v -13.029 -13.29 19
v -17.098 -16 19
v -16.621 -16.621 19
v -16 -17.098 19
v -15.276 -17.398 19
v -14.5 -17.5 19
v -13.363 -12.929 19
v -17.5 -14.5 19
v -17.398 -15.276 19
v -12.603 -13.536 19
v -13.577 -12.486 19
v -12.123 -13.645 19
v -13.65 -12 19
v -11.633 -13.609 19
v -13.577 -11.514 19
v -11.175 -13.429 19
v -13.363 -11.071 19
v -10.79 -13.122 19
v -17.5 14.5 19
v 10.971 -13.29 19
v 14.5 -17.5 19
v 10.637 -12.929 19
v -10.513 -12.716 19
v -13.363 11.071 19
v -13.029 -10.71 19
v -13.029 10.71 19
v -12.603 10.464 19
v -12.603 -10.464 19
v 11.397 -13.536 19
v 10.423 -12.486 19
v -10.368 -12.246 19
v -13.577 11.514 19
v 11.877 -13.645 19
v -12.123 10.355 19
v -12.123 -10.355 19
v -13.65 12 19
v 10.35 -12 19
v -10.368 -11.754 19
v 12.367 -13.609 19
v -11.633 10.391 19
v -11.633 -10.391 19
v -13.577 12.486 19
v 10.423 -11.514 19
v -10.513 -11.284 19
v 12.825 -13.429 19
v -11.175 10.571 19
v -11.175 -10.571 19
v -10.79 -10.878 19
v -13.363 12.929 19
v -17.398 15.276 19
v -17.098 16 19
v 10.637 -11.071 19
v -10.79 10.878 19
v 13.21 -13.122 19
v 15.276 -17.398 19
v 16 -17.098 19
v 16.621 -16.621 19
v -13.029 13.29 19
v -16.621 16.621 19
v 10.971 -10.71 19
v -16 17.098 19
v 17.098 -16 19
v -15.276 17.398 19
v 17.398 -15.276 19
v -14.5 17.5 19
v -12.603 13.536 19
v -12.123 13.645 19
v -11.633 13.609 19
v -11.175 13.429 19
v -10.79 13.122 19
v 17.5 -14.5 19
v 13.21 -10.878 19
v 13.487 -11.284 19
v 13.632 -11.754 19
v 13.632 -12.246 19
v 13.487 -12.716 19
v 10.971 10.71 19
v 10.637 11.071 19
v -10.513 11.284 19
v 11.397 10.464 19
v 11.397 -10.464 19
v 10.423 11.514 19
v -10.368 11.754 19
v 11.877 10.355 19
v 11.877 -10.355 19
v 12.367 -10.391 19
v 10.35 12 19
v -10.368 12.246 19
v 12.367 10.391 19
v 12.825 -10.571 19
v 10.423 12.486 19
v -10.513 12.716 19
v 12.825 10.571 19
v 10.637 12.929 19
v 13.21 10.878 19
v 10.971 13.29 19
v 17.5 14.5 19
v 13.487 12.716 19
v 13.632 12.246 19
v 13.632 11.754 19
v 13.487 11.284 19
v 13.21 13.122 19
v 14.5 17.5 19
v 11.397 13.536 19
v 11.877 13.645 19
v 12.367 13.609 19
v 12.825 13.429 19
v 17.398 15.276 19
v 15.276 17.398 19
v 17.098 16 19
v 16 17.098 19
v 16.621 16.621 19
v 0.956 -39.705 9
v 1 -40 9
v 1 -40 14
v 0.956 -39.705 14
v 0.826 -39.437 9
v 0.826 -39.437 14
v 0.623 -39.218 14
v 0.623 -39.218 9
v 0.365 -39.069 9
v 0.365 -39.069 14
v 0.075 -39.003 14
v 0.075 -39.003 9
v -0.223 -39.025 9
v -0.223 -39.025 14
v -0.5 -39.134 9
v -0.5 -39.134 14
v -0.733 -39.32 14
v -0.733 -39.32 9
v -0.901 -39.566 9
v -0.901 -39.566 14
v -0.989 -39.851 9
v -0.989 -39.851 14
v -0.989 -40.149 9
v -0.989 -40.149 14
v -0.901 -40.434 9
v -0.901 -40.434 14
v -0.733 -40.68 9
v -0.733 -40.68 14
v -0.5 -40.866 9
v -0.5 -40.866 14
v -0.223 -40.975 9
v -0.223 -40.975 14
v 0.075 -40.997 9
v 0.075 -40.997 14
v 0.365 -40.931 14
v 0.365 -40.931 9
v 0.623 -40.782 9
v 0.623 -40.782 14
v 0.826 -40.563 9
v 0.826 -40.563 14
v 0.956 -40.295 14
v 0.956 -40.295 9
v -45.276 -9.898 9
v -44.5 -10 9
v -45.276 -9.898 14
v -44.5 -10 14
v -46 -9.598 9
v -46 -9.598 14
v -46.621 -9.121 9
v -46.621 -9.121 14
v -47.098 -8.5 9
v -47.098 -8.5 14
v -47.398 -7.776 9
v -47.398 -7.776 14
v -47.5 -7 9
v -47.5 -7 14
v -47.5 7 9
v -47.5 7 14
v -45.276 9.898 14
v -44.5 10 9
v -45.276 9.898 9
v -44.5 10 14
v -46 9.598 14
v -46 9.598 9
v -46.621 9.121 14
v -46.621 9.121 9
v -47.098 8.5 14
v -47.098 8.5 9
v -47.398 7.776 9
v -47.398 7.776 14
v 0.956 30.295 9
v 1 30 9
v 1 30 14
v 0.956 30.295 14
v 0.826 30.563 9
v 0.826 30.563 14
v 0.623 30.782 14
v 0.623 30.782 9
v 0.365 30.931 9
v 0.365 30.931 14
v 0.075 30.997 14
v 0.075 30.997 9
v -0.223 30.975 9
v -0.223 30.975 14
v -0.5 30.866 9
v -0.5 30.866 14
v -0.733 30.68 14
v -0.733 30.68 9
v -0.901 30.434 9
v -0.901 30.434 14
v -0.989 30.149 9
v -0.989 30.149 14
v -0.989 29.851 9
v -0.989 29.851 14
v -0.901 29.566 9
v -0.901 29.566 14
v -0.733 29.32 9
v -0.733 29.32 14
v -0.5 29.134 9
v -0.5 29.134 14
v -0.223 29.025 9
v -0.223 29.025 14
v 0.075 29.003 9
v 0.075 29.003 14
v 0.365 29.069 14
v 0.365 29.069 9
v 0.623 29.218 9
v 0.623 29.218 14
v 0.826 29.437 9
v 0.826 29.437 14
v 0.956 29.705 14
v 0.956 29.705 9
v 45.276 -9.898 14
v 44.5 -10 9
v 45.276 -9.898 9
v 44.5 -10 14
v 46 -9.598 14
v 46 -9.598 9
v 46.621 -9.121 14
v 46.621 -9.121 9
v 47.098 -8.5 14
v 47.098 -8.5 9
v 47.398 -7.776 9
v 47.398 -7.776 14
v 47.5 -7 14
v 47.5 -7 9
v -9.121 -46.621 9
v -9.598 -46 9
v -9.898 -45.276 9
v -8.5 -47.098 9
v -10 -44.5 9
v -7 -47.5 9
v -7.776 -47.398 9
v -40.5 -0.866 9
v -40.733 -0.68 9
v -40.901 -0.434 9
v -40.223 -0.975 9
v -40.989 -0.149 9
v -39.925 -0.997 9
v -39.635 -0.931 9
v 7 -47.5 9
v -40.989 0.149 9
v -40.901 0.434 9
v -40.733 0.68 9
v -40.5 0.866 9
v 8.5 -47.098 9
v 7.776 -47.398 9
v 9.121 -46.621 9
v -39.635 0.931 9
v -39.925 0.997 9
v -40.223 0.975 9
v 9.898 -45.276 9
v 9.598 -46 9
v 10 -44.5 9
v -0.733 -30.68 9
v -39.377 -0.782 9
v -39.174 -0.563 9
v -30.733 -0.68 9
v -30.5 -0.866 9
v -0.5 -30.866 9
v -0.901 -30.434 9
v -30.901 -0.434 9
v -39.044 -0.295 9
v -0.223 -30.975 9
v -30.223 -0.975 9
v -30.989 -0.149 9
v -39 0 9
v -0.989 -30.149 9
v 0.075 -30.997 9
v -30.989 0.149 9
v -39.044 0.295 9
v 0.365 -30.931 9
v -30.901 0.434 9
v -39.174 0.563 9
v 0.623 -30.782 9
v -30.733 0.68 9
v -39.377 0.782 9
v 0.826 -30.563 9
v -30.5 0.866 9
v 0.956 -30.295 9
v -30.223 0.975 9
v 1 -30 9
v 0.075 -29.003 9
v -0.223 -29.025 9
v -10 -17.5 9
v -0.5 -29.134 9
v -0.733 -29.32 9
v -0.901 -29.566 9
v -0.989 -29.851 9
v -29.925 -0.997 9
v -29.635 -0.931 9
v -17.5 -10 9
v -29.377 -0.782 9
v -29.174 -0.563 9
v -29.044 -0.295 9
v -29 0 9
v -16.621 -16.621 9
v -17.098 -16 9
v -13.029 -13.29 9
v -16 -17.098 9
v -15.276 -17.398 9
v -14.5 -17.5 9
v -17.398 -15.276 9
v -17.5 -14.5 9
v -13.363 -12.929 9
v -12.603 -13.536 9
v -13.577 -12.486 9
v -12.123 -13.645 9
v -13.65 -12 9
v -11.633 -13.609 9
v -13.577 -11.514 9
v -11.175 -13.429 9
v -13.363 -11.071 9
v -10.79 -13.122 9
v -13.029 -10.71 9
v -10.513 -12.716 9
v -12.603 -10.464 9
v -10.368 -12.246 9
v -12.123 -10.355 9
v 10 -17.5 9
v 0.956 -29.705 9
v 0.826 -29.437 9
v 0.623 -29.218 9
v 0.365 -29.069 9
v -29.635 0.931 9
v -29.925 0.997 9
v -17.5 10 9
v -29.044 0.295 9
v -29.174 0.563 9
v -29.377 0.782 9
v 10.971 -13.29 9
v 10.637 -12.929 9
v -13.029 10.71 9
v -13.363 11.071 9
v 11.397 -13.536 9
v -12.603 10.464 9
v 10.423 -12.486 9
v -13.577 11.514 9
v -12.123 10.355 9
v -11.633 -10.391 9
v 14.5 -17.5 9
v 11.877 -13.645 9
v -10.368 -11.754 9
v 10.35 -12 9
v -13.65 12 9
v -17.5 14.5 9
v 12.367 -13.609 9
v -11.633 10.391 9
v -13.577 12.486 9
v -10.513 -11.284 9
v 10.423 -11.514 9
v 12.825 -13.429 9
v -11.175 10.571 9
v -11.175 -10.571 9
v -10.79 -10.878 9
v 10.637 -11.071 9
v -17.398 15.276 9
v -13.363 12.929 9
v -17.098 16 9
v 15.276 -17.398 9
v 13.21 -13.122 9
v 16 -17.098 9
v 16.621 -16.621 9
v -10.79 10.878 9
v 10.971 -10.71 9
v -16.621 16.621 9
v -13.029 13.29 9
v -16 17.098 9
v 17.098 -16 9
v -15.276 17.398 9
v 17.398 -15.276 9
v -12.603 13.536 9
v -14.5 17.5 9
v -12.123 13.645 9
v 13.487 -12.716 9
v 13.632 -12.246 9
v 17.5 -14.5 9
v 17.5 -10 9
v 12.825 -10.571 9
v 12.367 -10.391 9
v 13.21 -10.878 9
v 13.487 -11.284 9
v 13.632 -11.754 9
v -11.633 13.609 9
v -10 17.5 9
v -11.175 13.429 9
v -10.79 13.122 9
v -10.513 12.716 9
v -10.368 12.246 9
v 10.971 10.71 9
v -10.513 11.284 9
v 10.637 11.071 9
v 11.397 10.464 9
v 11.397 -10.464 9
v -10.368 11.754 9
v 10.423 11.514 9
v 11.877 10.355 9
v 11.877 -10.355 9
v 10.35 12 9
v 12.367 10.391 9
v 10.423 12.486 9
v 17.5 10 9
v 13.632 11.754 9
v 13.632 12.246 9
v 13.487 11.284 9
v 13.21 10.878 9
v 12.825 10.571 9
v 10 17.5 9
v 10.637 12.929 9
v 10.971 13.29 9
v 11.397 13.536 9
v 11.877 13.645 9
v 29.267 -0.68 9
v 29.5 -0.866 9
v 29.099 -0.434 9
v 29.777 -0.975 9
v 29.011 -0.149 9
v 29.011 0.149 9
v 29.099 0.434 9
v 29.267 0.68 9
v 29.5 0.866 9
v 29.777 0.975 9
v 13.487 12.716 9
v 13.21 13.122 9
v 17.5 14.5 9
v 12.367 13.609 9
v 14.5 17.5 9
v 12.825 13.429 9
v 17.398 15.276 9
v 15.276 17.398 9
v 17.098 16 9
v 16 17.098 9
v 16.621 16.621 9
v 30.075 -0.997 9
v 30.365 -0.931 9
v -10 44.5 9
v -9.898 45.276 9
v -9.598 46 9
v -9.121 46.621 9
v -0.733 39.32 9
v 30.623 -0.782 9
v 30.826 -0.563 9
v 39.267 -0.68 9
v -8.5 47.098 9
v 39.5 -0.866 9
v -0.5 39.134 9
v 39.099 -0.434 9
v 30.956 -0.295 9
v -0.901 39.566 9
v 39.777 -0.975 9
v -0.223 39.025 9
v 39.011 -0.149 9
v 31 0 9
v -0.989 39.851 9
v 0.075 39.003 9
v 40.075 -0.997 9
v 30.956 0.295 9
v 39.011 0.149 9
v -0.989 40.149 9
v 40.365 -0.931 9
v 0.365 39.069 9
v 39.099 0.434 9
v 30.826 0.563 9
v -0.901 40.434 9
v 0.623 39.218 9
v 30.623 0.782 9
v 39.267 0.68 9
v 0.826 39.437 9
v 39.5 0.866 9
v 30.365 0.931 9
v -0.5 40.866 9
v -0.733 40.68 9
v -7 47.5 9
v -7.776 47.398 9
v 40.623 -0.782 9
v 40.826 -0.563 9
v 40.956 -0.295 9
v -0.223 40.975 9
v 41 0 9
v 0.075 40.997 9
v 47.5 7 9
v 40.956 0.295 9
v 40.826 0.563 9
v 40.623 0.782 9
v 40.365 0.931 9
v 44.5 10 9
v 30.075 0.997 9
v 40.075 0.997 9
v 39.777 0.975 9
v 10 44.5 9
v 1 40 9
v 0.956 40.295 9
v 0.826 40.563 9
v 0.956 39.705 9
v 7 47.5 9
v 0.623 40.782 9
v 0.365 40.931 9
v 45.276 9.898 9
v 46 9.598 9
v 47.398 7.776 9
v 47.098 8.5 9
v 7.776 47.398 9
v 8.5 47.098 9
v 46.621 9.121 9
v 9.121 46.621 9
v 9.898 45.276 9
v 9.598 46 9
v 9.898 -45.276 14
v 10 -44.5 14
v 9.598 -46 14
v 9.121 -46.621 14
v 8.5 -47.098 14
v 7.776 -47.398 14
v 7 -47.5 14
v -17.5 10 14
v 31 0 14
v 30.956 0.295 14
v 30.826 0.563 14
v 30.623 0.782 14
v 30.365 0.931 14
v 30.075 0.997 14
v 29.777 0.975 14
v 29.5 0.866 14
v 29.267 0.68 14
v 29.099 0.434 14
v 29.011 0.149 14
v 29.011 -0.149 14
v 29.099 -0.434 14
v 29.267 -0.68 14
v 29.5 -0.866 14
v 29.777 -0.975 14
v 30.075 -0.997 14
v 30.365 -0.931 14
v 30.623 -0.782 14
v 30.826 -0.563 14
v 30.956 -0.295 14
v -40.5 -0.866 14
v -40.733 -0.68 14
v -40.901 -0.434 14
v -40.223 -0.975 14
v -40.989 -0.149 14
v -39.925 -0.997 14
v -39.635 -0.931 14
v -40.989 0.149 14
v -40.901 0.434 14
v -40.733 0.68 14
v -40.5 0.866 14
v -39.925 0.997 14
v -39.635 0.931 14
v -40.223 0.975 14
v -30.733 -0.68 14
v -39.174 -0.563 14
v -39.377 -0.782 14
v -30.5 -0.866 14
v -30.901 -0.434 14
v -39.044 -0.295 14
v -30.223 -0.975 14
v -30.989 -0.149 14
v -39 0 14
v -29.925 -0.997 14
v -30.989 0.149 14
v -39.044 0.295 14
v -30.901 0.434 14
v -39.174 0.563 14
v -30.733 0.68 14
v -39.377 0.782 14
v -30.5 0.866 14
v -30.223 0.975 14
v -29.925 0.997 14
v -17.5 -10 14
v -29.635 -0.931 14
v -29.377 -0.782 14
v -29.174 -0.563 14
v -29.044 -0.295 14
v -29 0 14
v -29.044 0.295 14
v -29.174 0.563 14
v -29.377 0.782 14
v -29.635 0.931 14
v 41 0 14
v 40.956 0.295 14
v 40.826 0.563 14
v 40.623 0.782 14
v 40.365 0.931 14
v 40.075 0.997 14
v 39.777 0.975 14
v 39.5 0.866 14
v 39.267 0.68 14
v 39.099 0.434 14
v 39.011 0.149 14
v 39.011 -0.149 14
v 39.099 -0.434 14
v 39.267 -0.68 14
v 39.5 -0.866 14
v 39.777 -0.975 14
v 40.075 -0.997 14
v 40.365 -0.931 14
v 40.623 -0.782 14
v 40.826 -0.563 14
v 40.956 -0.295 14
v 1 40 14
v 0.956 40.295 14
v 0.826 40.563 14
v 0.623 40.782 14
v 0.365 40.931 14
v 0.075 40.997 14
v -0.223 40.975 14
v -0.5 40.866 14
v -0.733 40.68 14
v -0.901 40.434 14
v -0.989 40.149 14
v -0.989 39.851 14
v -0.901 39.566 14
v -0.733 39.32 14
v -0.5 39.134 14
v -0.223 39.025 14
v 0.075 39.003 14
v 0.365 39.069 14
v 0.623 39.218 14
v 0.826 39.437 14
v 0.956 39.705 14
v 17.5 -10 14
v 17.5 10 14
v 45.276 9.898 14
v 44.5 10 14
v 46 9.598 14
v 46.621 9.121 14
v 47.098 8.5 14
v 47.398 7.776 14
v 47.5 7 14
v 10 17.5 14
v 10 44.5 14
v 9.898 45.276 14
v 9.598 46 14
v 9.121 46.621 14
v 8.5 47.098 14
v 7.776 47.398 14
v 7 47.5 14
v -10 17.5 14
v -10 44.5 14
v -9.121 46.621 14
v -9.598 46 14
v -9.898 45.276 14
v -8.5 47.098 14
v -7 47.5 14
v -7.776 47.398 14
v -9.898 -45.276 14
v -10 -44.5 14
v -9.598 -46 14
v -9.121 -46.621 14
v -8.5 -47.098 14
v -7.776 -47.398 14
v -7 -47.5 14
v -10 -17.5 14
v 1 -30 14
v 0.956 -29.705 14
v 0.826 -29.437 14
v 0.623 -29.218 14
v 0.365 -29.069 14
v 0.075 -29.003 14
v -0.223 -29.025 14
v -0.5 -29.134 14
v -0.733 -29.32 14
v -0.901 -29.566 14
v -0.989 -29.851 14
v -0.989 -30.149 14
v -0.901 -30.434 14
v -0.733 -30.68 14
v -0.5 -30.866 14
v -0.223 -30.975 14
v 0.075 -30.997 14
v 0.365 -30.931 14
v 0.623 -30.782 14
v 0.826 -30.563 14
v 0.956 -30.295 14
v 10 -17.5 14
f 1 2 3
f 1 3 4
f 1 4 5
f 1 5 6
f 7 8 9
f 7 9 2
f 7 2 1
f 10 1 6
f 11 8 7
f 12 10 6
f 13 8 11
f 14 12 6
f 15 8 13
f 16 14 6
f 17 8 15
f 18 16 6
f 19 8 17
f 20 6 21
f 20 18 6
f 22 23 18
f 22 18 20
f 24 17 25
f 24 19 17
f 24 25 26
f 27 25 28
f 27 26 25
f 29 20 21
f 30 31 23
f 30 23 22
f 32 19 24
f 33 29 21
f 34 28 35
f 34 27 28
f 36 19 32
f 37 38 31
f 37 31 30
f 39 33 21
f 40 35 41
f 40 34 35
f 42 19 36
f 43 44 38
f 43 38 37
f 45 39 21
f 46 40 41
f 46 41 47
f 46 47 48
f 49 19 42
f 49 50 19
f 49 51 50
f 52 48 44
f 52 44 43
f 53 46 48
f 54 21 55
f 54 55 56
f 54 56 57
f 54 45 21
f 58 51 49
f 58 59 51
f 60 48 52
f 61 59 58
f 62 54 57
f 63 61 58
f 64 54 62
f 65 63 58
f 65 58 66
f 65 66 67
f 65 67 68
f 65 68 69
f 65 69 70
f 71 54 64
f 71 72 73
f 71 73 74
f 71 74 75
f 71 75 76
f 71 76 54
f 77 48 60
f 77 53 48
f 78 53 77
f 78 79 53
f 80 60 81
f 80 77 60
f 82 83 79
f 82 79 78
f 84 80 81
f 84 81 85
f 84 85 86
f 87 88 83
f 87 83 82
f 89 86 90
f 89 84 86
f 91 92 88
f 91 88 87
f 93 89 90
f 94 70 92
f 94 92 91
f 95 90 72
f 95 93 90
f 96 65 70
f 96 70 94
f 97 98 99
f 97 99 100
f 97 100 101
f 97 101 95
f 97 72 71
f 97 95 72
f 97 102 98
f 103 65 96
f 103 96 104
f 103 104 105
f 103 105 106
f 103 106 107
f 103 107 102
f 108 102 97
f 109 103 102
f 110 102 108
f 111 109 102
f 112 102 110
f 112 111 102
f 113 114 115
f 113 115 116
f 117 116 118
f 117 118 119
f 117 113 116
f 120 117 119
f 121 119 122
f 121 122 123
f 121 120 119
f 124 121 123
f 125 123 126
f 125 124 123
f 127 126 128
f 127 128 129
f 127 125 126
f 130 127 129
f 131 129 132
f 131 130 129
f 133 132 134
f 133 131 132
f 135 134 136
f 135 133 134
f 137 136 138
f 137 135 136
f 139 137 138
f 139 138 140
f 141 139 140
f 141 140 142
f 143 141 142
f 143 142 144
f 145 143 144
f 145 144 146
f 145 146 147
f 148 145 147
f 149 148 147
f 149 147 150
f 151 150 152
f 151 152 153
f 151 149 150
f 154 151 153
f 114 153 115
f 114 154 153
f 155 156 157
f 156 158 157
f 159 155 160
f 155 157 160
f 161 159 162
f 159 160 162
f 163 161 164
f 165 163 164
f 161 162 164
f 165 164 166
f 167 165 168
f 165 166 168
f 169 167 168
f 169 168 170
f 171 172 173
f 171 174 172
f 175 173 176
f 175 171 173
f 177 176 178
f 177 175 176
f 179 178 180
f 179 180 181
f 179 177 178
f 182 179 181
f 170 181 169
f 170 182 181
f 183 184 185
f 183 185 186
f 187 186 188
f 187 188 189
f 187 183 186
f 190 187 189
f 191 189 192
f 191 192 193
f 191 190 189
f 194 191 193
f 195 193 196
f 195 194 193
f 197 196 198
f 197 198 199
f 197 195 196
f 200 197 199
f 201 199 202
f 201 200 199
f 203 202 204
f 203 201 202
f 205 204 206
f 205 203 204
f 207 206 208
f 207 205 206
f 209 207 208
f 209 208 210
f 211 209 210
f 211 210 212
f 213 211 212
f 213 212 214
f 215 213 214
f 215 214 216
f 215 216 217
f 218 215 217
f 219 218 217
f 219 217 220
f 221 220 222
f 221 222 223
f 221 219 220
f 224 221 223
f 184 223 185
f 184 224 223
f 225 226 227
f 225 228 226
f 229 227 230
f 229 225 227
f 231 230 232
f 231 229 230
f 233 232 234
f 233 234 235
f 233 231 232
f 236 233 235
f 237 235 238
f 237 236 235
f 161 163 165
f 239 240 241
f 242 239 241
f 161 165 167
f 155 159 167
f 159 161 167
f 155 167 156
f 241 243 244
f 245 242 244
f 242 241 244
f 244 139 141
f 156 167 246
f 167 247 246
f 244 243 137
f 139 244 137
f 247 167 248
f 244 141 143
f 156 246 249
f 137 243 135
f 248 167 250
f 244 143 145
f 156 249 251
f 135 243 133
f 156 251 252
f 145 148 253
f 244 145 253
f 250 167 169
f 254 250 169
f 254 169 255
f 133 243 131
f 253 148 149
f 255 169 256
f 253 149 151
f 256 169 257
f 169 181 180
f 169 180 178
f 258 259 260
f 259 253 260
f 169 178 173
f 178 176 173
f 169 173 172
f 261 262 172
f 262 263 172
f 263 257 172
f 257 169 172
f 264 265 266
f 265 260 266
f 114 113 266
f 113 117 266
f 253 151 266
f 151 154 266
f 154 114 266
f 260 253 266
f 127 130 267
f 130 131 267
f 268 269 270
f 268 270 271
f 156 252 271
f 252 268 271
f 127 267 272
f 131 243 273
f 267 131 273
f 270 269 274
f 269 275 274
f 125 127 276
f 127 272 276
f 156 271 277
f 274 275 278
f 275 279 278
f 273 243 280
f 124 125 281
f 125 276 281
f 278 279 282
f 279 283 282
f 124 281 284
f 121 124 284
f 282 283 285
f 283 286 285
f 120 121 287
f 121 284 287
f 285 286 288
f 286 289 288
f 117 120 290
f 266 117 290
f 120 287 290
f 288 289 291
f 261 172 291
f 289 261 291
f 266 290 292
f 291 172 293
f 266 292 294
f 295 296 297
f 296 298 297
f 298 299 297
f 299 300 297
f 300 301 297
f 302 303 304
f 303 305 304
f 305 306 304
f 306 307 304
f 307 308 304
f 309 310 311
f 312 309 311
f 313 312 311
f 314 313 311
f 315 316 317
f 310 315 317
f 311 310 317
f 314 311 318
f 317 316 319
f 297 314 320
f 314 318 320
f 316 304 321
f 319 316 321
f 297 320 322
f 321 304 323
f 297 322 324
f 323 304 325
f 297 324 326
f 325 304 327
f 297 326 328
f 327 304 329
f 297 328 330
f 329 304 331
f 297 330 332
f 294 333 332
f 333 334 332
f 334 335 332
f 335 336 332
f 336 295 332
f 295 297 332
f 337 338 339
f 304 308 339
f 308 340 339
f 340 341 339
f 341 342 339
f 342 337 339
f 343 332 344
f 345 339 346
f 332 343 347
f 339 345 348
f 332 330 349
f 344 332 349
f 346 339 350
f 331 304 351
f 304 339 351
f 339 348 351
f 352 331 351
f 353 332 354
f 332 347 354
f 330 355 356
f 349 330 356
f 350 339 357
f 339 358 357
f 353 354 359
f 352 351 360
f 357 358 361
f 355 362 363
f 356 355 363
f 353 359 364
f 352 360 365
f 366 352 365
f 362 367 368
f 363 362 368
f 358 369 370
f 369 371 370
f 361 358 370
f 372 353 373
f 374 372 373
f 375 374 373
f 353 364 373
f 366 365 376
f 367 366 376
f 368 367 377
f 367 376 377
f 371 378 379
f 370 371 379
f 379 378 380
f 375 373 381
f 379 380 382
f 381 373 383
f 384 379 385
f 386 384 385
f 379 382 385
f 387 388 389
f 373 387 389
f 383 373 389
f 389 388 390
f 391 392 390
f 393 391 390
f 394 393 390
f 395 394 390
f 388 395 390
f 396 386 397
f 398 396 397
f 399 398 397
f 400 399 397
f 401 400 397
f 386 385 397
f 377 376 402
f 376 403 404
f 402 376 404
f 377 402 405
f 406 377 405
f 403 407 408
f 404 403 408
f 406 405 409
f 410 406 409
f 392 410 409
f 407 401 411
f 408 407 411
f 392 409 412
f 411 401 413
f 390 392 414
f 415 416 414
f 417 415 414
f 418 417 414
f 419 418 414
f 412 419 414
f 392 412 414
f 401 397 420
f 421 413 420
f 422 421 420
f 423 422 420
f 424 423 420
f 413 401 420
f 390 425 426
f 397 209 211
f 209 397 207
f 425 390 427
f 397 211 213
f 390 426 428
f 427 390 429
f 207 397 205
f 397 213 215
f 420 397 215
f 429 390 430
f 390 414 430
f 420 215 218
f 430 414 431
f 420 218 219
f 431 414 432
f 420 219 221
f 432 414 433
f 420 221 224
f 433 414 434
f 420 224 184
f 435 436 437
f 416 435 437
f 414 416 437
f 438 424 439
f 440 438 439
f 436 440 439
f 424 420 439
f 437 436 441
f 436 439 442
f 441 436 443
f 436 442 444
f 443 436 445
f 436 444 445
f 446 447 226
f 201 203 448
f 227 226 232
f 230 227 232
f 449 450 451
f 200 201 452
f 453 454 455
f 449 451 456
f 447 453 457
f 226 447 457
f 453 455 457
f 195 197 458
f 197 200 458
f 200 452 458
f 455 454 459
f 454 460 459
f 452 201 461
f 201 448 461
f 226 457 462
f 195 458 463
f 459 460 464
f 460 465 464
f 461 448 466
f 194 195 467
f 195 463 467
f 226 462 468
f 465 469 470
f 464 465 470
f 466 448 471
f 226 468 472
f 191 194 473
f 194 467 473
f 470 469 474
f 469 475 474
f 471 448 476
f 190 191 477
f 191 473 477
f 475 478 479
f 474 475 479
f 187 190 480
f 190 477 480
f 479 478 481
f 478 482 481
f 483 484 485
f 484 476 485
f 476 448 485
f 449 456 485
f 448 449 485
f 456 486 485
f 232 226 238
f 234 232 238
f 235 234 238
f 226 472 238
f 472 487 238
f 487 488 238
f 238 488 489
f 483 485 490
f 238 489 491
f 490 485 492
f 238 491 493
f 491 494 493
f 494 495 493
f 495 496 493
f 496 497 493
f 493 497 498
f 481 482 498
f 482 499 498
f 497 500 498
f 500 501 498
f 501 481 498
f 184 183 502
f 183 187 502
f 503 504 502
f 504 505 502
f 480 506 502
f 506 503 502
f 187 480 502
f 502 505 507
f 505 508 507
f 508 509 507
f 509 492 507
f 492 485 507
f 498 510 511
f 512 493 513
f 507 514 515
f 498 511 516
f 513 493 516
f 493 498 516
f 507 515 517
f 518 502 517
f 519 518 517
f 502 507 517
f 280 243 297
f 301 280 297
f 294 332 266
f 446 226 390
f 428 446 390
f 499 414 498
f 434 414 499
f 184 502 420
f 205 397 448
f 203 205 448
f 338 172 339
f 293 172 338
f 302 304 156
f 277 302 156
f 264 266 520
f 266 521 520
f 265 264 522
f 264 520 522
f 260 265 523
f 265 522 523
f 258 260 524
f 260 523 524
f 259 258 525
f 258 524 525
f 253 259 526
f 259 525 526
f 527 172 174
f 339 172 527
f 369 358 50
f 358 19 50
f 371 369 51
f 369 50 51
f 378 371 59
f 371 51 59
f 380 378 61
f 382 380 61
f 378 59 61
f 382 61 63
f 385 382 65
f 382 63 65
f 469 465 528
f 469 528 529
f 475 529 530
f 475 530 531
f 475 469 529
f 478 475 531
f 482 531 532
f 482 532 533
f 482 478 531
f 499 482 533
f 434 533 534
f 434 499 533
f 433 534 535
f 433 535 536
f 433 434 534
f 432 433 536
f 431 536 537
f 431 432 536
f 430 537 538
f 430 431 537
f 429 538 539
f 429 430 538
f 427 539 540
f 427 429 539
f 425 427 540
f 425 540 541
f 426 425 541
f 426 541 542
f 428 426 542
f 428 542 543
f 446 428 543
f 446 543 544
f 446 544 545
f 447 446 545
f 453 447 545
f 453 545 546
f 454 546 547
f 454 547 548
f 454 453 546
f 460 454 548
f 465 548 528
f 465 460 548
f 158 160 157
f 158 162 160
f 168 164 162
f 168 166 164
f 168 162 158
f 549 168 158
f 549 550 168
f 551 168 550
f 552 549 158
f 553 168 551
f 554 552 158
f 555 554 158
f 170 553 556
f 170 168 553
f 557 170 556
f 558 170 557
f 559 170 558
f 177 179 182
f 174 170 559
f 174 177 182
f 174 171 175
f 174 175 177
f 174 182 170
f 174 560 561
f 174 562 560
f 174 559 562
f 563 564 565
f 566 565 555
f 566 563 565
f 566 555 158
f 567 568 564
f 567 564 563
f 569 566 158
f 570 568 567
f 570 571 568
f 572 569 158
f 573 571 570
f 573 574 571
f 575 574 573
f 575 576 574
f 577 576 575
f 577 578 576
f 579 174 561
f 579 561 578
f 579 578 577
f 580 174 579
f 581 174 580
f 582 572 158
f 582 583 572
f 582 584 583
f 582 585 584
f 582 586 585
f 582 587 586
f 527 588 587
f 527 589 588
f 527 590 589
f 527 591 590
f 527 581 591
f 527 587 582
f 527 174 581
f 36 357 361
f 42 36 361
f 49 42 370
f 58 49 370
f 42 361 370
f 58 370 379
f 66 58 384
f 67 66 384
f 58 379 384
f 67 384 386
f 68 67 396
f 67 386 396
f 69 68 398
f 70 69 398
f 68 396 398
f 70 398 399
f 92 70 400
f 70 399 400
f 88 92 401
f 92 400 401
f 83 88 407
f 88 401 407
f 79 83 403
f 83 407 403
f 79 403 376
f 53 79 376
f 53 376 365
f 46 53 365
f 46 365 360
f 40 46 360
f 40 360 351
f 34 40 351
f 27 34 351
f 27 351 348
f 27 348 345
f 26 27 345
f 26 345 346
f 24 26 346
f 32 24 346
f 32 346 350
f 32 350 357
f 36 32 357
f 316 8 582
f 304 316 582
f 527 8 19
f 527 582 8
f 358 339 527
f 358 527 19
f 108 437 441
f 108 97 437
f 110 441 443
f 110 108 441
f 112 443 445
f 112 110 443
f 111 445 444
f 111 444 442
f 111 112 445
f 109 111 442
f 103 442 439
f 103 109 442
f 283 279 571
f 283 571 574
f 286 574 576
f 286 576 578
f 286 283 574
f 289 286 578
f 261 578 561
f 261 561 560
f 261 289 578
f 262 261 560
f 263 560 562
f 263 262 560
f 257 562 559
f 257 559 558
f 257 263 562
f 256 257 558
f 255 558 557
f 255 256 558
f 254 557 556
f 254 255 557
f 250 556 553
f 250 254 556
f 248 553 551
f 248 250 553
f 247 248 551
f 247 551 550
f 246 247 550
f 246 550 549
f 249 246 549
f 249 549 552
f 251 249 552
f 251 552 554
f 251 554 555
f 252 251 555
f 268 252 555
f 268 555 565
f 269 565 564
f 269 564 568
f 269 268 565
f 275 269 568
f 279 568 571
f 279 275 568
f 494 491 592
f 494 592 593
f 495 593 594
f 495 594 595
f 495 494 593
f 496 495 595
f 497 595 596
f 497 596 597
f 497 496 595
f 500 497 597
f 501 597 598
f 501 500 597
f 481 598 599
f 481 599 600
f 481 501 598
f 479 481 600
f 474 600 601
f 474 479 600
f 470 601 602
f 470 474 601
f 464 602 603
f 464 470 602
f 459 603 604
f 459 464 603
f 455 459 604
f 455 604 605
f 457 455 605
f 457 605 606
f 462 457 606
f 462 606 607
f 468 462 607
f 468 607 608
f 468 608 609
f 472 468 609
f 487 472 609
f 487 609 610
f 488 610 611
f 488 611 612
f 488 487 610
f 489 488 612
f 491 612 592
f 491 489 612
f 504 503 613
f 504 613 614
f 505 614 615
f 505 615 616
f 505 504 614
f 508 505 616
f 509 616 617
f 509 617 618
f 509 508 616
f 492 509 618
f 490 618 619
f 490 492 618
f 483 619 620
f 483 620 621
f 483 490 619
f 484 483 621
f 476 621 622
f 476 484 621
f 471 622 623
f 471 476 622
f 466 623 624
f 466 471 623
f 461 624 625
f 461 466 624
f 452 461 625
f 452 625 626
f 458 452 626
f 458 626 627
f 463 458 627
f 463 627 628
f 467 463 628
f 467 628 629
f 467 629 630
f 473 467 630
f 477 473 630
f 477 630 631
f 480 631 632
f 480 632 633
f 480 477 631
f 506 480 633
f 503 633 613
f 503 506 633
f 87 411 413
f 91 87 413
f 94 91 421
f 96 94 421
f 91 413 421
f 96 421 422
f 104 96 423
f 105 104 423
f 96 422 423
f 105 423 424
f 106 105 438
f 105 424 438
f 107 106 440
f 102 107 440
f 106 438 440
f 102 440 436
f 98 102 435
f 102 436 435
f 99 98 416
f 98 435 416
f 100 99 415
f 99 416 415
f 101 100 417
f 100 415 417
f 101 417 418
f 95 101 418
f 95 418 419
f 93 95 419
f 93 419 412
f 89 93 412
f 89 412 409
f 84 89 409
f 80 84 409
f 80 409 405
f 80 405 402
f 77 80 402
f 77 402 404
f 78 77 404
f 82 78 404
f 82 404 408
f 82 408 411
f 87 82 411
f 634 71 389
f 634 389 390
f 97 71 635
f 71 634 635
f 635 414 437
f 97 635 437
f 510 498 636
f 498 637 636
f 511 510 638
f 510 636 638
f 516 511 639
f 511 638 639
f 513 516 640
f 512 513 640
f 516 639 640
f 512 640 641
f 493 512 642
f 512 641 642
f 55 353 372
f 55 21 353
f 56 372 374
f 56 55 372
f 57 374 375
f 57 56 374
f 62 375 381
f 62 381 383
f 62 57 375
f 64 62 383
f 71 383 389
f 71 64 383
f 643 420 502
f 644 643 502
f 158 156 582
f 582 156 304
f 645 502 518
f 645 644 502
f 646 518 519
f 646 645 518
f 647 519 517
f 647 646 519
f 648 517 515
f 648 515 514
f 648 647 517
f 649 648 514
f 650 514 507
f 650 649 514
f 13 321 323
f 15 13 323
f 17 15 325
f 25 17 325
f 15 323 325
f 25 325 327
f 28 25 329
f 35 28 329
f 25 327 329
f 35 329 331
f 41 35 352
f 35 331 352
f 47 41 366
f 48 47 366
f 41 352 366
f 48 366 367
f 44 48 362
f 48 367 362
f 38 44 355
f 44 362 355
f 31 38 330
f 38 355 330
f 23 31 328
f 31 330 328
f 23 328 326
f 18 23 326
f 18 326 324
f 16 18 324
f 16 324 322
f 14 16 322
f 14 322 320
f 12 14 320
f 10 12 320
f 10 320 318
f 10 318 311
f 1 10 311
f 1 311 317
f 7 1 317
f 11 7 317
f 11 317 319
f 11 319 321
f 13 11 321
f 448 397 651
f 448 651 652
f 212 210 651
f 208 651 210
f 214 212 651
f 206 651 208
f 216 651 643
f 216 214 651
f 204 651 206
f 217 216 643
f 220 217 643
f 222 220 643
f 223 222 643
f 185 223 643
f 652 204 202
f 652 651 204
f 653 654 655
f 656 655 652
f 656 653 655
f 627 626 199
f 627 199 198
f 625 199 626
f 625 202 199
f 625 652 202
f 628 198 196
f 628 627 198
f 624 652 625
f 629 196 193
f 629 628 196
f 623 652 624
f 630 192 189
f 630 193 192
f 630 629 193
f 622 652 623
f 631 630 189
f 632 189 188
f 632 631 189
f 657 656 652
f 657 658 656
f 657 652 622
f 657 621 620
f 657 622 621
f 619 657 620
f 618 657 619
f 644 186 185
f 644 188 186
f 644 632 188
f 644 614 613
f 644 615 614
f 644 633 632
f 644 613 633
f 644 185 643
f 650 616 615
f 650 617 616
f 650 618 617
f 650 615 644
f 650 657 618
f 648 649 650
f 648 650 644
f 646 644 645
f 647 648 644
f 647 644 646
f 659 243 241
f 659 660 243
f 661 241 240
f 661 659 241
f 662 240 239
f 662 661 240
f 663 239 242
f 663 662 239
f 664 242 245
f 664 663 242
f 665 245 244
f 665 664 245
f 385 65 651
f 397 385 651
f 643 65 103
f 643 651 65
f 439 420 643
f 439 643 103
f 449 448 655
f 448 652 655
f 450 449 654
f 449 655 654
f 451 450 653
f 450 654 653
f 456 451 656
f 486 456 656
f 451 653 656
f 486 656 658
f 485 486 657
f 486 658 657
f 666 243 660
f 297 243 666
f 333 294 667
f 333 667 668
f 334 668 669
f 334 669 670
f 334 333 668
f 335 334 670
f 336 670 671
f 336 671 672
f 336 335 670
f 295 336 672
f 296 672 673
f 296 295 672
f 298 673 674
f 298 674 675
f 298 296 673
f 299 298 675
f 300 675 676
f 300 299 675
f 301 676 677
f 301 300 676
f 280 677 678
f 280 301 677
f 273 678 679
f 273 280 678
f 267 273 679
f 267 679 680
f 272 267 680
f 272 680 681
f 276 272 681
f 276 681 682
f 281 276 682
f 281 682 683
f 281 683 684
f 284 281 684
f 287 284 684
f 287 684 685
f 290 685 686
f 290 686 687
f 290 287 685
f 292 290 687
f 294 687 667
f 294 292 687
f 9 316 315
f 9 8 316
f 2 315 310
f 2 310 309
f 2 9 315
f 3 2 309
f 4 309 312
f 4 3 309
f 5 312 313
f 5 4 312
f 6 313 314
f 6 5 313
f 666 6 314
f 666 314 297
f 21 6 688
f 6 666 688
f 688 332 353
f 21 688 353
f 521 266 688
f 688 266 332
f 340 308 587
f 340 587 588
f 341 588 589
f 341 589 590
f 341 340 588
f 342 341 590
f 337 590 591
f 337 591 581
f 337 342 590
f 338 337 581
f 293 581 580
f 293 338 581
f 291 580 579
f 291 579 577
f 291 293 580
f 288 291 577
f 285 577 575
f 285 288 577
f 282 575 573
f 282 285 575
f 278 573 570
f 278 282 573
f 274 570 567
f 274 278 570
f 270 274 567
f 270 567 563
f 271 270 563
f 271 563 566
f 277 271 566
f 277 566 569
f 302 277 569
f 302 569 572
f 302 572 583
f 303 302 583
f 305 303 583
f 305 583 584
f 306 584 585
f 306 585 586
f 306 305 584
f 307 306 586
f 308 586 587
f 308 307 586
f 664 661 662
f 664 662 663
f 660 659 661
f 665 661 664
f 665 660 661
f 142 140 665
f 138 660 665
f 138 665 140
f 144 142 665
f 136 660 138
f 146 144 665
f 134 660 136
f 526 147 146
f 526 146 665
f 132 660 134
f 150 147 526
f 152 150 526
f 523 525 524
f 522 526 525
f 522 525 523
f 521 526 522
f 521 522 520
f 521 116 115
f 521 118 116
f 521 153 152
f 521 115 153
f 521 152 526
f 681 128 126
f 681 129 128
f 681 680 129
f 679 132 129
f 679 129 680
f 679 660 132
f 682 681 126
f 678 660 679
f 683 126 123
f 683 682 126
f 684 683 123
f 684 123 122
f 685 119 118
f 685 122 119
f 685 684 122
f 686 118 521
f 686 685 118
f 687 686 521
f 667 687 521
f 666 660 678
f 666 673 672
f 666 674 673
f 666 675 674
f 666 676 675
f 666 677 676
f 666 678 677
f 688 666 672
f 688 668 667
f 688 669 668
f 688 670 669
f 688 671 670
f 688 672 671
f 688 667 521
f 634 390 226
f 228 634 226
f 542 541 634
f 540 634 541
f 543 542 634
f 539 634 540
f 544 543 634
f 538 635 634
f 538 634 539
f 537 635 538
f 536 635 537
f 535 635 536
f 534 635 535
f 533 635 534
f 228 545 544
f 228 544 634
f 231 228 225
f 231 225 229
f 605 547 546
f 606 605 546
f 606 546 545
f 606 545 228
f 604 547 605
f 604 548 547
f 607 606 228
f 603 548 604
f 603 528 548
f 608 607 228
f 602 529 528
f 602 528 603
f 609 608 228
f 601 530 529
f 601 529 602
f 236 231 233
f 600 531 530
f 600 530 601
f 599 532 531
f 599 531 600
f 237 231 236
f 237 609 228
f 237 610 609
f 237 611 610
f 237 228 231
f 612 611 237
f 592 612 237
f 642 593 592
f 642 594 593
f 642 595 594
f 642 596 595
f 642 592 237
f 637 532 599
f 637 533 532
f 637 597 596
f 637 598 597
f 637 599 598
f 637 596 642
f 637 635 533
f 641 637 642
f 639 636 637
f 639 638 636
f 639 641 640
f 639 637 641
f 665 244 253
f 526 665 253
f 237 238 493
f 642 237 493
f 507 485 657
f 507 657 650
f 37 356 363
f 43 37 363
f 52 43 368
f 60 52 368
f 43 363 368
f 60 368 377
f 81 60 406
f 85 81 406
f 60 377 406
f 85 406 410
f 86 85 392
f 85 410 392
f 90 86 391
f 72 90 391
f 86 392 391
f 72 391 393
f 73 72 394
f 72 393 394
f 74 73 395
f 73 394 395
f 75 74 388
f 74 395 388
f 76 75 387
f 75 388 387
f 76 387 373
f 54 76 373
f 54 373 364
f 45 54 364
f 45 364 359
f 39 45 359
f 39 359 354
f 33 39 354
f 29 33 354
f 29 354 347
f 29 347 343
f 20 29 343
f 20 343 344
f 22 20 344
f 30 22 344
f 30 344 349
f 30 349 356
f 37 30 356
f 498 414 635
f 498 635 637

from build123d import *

# Parameters (mm, degrees)
F1_W     = 35
F1_H     = 35
F2_DEPTH = 10
F3_R     = 3
F4_W     = 30
F4_H     = 20
F4_R     = 1
F4_W_2   = 20
F4_H_2   = 30
F5_DEPTH = 5
F6_R     = 3
F8_D     = 3.3


with BuildPart() as f2:
    # F1 (on offset) → F2 (new body)
    with BuildSketch(Plane.XY.offset(9)):
        Rectangle(F1_W, F1_H)
    extrude(amount=F2_DEPTH)

    # F3
    f3_edges = [f2.edges().sort_by_distance(p)[0] for p in [
        (-17.5, -17.5, 14),
        (17.5, -17.5, 14),
        (17.5, 17.5, 14),
        (-17.5, 17.5, 14),
    ]]
    fillet(f3_edges, radius=F3_R)

    # F4 (on offset) → F5 (join)
    with BuildSketch(Plane.XY.offset(9)):
        with Locations((32.5, 0)):
            Rectangle(F4_W, F4_H)
        with Locations((30, 0)):
            Circle(F4_R, mode=Mode.SUBTRACT)
        with Locations((40, 0)):
            Circle(F4_R, mode=Mode.SUBTRACT)
        with Locations((-32.5, 0)):
            Rectangle(F4_W, F4_H)
        with Locations((-40, 0)):
            Circle(F4_R, mode=Mode.SUBTRACT)
        with Locations((-30, 0)):
            Circle(F4_R, mode=Mode.SUBTRACT)
        with Locations((0, -32.5)):
            Rectangle(F4_W_2, F4_H_2)
        with Locations((0, -40)):
            Circle(F4_R, mode=Mode.SUBTRACT)
        with Locations((0, -30)):
            Circle(F4_R, mode=Mode.SUBTRACT)
        with Locations((0, 32.5)):
            Rectangle(F4_W_2, F4_H_2)
        with Locations((0, 30)):
            Circle(F4_R, mode=Mode.SUBTRACT)
        with Locations((0, 40)):
            Circle(F4_R, mode=Mode.SUBTRACT)
    extrude(amount=F5_DEPTH)

    # F6
    f6_edges = [f2.edges().sort_by_distance(p)[0] for p in [
        (-47.5, 10, 11.5),
        (-47.5, -10, 11.5),
        (-10, -47.5, 11.5),
        (10, -47.5, 11.5),
        (47.5, -10, 11.5),
        (47.5, 10, 11.5),
        (10, 47.5, 11.5),
        (-10, 47.5, 11.5),
    ]]
    fillet(f6_edges, radius=F6_R)

    # F8 (through all)
    with Locations(Plane.XY.offset(19)):
        with Locations((-12, 12), (12, 12), (12, -12), (-12, -12)):
            Hole(F8_D / 2)


solid = f2.part
